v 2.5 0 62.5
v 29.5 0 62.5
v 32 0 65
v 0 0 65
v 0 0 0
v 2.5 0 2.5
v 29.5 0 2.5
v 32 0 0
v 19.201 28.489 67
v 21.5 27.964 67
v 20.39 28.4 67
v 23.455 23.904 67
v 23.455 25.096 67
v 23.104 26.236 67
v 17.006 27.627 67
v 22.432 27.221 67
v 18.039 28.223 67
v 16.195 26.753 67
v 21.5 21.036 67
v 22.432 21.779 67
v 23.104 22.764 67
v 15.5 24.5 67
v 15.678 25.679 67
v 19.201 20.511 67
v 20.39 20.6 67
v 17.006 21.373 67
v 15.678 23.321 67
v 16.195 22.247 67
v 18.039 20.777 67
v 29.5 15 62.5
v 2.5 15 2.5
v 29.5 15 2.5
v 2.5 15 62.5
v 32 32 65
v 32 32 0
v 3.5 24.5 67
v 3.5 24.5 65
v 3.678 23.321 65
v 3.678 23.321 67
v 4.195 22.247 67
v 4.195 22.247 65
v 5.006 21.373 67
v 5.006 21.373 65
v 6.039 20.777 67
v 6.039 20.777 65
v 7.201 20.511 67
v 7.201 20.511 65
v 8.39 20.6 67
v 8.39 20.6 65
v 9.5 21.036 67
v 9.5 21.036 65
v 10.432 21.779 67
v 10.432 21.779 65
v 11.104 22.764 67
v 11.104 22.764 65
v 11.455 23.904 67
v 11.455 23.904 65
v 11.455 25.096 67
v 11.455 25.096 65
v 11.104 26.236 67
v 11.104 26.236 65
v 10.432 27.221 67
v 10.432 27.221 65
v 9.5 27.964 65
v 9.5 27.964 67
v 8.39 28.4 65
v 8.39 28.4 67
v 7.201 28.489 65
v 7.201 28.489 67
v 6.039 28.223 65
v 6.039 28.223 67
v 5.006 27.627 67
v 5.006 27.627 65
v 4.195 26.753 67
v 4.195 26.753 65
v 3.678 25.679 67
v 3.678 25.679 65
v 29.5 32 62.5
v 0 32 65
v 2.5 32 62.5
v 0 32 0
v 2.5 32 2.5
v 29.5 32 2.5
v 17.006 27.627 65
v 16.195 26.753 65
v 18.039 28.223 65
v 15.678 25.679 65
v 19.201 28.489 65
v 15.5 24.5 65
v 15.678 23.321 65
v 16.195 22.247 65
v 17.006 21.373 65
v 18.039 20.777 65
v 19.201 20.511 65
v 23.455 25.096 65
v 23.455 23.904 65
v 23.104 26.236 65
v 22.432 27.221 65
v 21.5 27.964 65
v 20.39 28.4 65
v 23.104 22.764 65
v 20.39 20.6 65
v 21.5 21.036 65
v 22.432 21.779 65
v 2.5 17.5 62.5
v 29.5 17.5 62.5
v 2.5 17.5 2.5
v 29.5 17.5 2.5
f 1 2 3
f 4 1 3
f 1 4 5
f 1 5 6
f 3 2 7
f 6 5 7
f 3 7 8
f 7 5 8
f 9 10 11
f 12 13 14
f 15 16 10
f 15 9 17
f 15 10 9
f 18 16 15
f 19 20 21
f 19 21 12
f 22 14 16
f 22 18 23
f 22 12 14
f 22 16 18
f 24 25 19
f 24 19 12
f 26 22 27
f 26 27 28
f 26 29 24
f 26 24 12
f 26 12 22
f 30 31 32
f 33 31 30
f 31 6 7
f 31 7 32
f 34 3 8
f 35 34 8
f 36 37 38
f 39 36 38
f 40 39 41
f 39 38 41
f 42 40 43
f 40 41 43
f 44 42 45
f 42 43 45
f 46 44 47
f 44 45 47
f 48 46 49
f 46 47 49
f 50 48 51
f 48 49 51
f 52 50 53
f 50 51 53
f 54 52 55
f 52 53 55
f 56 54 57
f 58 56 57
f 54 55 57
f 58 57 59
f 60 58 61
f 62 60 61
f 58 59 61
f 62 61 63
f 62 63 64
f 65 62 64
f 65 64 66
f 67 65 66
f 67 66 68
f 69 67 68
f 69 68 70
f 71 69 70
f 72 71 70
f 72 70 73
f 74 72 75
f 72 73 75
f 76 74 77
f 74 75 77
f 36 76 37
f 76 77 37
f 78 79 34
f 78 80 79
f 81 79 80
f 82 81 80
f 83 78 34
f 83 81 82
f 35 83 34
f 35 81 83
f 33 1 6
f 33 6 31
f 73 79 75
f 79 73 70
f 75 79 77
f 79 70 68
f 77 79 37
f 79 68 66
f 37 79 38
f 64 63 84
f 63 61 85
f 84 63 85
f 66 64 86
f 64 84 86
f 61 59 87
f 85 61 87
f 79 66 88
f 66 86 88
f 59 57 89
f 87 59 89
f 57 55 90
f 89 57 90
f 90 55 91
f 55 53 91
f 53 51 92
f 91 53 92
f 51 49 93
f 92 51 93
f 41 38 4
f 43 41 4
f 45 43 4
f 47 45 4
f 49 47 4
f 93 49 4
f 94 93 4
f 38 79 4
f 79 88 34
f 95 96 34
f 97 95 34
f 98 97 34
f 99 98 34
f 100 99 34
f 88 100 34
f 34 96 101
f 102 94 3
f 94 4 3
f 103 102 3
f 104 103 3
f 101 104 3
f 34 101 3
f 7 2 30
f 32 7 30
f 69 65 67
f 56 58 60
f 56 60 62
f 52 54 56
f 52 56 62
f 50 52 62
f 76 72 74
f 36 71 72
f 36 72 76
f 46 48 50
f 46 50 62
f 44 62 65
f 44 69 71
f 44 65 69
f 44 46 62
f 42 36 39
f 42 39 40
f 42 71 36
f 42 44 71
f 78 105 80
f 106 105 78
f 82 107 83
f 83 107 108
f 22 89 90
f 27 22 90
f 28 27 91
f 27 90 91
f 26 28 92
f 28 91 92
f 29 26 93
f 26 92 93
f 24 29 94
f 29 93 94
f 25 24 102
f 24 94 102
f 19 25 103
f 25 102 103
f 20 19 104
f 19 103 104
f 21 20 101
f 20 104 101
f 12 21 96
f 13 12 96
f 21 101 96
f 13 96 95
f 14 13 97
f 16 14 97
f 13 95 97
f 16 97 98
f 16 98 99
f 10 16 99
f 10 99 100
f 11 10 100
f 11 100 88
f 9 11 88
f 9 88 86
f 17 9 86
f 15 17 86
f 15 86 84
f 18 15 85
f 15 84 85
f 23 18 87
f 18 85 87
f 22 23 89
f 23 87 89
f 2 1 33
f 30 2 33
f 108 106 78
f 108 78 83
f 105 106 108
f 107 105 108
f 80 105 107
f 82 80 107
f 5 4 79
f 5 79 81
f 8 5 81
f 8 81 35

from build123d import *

# Parameters (mm, degrees)
SKETCH1_W                 = 32
SKETCH1_H                 = 65
BOSS_EXTRUDE1_DEPTH       = 32
SHELL1_T                  = -2.5
SHELL1_THICKNESS_2_FACE_W = 60
SHELL1_THICKNESS_2_FACE_H = 27
SHELL1_THICKNESS_2_DEPTH  = 15
SHELL2_START              = 2.5
SHELL2_OUTLINE_W          = 15
SHELL2_OUTLINE_H          = 60
SHELL2_DEPTH              = 27
SKETCH2_R                 = 4
BOSS_EXTRUDE2_DEPTH       = 2


# Read off the part's stored shape, not the designer's step: Shell2
with BuildPart() as part:
    # Sketch1 → Boss-Extrude1 (new body)
    with BuildSketch(Plane(origin=(0, 0, 0), x_dir=(1, 0, 0), z_dir=(0, 1, 0))):
        with Locations((16, -32.5)):
            Rectangle(SKETCH1_W, SKETCH1_H)
    extrude(amount=BOSS_EXTRUDE1_DEPTH)

    # Shell1
    shell1_openings = [part.faces().sort_by_distance(p)[0] for p in [
        (16, 32, 32.5),
    ]]
    offset(amount=SHELL1_T, openings=shell1_openings, kind=Kind.INTERSECTION)

    # Shell1 thickness 2 face (on inner face of the shell) → Shell1 thickness 2 (add)
    with BuildSketch(Plane(origin=(16, 2.5, 32.5), x_dir=(0, 0, -1), z_dir=(0, -1, 0))):
        Rectangle(SHELL1_THICKNESS_2_FACE_W, SHELL1_THICKNESS_2_FACE_H)
    extrude(amount=-SHELL1_THICKNESS_2_DEPTH)

    # Shell2 outline → Shell2 (cut)
    with BuildSketch(Plane.YZ.offset(SHELL2_START)):
        with Locations((7.5, 32.5)):
            Rectangle(SHELL2_OUTLINE_W, SHELL2_OUTLINE_H)
    extrude(amount=SHELL2_DEPTH, mode=Mode.SUBTRACT)

    # Sketch2 → Boss-Extrude2 (add)
    with BuildSketch(Plane.XY.offset(65)):
        with Locations(Location((7.5, 24.5, 0), (0, 0, 180))):
            Circle(SKETCH2_R)
        with Locations(Location((19.5, 24.5, 0), (0, 0, 180))):
            Circle(SKETCH2_R)
    extrude(amount=BOSS_EXTRUDE2_DEPTH)


solid = part.part
